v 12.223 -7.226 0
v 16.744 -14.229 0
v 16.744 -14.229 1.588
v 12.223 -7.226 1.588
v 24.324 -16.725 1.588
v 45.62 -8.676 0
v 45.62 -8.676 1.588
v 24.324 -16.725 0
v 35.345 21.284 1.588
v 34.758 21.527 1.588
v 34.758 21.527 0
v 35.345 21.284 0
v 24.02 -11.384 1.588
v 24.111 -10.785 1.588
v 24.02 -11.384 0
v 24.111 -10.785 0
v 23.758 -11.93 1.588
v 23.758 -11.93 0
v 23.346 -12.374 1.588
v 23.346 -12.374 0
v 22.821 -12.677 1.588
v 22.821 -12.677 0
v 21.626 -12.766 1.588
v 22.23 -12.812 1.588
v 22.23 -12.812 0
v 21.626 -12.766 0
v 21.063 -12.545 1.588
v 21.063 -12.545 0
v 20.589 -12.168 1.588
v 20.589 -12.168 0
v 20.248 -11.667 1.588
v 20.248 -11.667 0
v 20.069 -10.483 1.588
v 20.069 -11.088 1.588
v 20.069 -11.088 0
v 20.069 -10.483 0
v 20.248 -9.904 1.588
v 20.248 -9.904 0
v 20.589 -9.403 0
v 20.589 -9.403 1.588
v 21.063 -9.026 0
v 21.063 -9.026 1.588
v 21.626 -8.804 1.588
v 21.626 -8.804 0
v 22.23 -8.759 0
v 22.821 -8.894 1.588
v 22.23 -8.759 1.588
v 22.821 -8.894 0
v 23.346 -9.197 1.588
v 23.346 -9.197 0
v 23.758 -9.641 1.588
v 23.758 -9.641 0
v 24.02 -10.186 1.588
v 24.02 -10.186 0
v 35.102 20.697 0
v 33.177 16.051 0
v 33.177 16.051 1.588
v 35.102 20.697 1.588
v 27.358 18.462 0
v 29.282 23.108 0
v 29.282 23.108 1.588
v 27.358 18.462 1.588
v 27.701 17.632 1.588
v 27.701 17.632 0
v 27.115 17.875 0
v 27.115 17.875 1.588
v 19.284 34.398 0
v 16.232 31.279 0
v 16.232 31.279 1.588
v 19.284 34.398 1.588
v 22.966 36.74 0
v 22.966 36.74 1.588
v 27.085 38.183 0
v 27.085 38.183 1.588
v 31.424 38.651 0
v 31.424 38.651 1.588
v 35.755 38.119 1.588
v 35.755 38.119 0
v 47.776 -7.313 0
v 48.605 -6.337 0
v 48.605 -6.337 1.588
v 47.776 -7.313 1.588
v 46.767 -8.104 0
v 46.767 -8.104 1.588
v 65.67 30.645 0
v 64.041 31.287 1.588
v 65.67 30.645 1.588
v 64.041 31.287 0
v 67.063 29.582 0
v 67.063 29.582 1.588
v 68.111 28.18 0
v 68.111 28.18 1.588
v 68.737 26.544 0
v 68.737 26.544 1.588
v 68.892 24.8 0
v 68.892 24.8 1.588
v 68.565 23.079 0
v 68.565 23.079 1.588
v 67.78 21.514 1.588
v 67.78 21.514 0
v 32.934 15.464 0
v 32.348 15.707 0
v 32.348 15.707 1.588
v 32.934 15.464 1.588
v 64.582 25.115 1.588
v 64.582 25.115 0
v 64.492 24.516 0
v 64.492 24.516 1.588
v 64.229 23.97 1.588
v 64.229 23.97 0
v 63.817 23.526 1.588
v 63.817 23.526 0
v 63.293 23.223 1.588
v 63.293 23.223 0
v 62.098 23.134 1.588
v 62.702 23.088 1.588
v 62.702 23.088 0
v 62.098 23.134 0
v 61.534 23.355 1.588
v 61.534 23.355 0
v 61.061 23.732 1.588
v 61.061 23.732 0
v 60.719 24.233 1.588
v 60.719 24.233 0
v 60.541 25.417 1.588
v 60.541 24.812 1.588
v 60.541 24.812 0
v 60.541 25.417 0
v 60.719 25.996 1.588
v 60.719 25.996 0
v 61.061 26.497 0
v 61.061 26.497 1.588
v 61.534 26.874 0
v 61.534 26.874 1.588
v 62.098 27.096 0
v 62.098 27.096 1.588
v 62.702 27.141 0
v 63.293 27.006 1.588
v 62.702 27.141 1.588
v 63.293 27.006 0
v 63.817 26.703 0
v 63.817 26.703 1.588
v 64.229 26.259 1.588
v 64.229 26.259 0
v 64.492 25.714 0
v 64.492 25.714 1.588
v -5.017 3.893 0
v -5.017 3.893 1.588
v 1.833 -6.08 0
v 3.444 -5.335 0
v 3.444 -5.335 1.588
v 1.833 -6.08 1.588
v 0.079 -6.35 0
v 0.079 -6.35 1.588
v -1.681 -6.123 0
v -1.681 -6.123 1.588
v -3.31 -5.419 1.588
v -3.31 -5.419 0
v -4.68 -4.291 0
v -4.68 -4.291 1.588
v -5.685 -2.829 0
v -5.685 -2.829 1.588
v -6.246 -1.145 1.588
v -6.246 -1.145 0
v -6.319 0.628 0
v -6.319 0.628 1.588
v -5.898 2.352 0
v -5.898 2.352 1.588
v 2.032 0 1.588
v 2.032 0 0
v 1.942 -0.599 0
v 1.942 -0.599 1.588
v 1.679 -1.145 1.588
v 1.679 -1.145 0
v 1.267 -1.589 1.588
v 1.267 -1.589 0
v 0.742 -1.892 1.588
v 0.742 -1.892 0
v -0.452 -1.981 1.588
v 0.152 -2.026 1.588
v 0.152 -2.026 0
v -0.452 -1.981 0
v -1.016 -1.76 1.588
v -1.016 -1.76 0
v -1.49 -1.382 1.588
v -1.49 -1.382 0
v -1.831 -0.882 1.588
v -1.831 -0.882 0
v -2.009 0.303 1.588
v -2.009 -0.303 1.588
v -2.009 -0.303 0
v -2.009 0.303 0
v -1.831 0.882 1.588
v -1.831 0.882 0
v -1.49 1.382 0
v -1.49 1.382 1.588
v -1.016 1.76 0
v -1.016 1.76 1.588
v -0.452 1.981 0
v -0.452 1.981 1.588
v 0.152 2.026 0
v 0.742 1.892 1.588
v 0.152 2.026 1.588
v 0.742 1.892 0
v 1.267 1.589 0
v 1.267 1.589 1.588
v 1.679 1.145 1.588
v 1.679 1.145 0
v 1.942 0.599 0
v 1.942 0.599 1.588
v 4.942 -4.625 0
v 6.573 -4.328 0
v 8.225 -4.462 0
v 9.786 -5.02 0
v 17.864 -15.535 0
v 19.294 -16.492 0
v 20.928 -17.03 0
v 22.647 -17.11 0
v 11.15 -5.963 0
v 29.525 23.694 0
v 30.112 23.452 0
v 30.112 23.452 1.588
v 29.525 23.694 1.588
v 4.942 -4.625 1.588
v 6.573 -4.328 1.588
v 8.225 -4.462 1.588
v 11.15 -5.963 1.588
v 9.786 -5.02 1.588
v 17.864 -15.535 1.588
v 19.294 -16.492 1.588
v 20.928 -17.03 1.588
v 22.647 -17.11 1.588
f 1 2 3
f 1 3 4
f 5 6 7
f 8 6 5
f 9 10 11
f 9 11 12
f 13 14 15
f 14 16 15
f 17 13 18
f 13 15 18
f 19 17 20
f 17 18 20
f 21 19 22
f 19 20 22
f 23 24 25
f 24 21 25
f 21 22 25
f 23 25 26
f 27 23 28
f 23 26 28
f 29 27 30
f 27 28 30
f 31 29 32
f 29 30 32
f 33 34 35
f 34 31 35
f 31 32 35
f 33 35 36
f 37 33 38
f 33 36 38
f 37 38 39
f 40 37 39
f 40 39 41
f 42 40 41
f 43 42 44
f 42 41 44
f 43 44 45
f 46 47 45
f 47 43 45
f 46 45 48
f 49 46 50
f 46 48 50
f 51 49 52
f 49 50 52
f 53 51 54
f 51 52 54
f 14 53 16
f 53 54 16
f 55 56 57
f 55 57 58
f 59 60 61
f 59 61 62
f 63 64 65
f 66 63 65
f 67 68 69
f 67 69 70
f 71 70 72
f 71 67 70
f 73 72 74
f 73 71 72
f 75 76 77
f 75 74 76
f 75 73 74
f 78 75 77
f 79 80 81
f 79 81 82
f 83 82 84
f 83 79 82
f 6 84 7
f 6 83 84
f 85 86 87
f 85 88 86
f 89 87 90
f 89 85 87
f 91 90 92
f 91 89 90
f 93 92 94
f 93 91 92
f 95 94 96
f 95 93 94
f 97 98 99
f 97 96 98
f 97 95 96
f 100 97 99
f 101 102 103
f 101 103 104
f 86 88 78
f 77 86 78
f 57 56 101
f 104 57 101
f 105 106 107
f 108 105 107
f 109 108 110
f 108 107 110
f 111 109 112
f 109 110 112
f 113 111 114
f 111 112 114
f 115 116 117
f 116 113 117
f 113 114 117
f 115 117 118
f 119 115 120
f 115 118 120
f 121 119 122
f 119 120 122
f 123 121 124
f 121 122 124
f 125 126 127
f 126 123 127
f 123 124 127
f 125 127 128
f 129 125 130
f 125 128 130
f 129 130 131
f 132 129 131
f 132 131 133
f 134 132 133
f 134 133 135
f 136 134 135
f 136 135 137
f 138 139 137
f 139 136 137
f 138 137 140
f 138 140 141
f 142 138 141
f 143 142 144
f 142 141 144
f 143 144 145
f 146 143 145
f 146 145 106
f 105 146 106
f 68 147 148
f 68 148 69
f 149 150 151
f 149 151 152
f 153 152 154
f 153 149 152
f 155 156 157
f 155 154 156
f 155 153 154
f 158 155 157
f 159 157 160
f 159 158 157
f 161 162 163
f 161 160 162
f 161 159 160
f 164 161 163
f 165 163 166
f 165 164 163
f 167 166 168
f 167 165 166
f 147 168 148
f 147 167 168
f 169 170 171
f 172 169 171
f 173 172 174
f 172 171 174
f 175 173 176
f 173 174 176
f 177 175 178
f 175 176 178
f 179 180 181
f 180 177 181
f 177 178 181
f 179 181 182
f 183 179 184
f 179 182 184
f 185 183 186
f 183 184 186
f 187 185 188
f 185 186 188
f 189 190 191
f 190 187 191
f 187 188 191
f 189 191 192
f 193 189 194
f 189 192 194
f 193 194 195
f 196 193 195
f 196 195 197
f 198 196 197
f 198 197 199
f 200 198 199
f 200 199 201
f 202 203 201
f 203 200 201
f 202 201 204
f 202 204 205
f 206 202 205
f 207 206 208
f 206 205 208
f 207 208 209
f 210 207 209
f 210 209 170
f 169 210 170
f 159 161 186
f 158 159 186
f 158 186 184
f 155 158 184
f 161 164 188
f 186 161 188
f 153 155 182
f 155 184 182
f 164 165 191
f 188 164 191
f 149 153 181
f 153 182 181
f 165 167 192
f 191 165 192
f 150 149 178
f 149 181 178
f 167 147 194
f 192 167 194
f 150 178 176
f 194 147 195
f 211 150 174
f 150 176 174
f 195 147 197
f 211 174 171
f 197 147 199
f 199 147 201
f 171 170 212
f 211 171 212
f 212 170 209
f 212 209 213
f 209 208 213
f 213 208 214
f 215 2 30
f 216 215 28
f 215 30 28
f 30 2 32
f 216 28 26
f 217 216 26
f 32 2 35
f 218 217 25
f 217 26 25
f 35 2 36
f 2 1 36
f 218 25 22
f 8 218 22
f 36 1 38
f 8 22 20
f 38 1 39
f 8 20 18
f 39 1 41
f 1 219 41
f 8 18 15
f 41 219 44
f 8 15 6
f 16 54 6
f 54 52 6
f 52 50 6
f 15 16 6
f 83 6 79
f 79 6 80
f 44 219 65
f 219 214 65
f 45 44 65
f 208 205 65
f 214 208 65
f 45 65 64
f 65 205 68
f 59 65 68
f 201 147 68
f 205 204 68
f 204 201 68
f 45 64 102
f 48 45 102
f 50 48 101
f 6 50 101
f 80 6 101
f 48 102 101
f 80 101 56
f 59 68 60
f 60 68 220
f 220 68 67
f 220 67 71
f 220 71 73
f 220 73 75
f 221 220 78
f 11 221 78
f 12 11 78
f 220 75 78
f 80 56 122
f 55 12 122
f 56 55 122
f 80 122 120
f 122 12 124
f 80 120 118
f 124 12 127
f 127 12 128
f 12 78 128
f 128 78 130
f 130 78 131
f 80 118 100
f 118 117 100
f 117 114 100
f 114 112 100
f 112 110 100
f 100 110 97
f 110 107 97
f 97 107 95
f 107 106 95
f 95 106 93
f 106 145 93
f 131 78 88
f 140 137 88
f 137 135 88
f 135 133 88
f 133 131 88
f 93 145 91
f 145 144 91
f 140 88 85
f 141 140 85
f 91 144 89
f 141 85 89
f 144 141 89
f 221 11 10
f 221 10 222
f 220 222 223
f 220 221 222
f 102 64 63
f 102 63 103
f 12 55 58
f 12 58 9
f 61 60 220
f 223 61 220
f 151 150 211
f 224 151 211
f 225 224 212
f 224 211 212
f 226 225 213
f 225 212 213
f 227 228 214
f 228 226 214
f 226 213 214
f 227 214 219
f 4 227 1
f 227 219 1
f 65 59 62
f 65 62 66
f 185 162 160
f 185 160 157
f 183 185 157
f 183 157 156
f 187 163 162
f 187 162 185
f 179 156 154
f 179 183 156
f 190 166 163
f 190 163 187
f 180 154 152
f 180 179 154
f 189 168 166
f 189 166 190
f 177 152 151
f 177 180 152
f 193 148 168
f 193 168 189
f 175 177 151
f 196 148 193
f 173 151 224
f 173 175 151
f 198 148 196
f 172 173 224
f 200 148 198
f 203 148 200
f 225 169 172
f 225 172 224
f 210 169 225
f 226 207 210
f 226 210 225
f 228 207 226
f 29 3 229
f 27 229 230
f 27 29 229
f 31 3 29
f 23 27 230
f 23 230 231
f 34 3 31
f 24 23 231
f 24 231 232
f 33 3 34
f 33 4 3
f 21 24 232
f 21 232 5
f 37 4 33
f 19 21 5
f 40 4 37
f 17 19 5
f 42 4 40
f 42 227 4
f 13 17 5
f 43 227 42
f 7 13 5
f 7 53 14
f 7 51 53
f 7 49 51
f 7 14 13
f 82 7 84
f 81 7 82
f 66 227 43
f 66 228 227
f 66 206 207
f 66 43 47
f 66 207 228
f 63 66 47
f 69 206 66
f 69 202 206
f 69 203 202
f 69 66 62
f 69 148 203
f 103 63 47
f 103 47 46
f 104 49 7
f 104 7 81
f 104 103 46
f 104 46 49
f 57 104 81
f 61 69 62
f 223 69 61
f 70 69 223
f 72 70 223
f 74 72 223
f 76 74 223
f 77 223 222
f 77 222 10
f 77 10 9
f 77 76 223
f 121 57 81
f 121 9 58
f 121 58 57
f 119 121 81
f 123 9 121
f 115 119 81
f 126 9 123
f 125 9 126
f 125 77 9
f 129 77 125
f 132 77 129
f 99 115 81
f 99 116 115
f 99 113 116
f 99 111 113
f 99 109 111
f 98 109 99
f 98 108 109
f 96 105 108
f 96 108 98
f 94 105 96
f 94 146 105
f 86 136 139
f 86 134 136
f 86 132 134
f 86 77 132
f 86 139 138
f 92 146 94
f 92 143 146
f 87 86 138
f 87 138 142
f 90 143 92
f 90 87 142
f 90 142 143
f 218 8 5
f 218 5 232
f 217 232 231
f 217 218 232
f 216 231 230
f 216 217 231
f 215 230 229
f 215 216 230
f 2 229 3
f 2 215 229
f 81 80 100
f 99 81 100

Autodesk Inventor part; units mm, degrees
ref_plane "YZ Plane" through (0, 0, 0) normal (1, 0, 0) x (0, 1, 0)
ref_plane "XZ Plane" through (0, 0, 0) normal (0, 1, 0) x (-1, 0, 0)
ref_plane "XY Plane" through (0, 0, 0) normal (0, 0, 1) x (1, 0, 0)
sketch "Sketch1" plane through (0, 0, 0) normal (0, 0, 1) x (1, 0, 0)
  circle A0 centre (0, 0) radius 2.0955 construction
  circle A1 centre (31.2825, 19.6012) radius 7.2 construction
  circle A2 centre (43.3748, -2.7357) radius 2.15 construction
  circle A3 centre (31.2825, 19.6012) radius 31.75 construction
  circle A4 centre (43.3748, -2.7357) radius 2.032 construction
  line L0 (31.2825, 19.6012) -> (31.2825, -12.1488) construction
  circle A5 centre (31.2825, -12.1488) radius 2.032 construction
  line L1 (31.2825, 19.6012) -> (62.5502, 25.1146) construction
  line L2 (31.2825, 19.6012) -> (63.0325, 19.6012) construction
  circle A6 centre (62.5502, 25.1146) radius 2.032
  arc A7 (67.7804, 21.5135) -> (64.041, 31.2871) centre (62.5502, 25.1146) ccw
  circle A8 centre (0, 0) radius 2.032
  arc A9 (-5.017, 3.8926) -> (3.4439, -5.335) centre (0, 0) ccw
  arc A10 (45.62, -8.6755) -> (48.605, -6.3367) centre (43.3748, -2.7357) ccw
  circle A11 centre (22.0786, -10.7854) radius 2.032
  line L3 (48.605, -6.3367) -> (67.7804, 21.5135)
  arc A12 (35.755, 38.1188) -> (16.2316, 31.279) centre (31.2825, 19.6012) ccw
  line L4 (64.041, 31.2871) -> (35.755, 38.1188)
  line L5 (-5.017, 3.8926) -> (16.2316, 31.279)
  arc A13 (16.7437, -14.2294) -> (24.3239, -16.7253) centre (22.0786, -10.7854) ccw
  arc A14 (12.2228, -7.226) -> (3.4439, -5.335) centre (6.8878, -10.67) ccw
  line L6 (16.7437, -14.2294) -> (12.2228, -7.226)
  line L7 (45.9985, -8.5324) -> (24.3239, -16.7253)
  line L8 (27.7013, 17.6318) -> (32.3477, 15.7072)
  line L9 (27.7013, 17.6318) -> (27.7013, 17.6318)
  line L10 (32.3477, 15.7072) -> (27.7013, 17.6318)
  line L11 (32.3477, 15.7072) -> (32.3477, 15.7072)
  line L12 (33.1773, 16.0509) -> (35.1019, 20.6973)
  line L13 (33.1773, 16.0509) -> (33.1773, 16.0509)
  line L14 (35.1019, 20.6973) -> (33.1773, 16.0509)
  line L15 (35.1019, 20.6973) -> (35.1019, 20.6973)
  line L16 (34.7583, 21.5269) -> (30.1119, 23.4515)
  line L17 (34.7583, 21.5269) -> (34.7583, 21.5269)
  line L18 (30.1119, 23.4515) -> (34.7583, 21.5269)
  line L19 (30.1119, 23.4515) -> (30.1119, 23.4515)
  line L20 (29.2822, 23.1079) -> (27.3576, 18.4615)
  line L21 (29.2822, 23.1079) -> (29.2822, 23.1079)
  line L22 (27.3576, 18.4615) -> (29.2822, 23.1079)
  line L23 (27.3576, 18.4615) -> (27.3576, 18.4615)
  line L24 (35.1019, 20.6973) -> (35.3449, 21.2839)
  line L25 (34.7583, 21.5269) -> (35.3449, 21.2839)
  line L26 (33.1773, 16.0509) -> (32.9343, 15.4642)
  line L27 (32.3477, 15.7072) -> (32.9343, 15.4642)
  line L28 (29.2822, 23.1079) -> (29.5252, 23.6945)
  line L29 (30.1119, 23.4515) -> (29.5252, 23.6945)
  line L30 (27.3576, 18.4615) -> (27.1146, 17.8748)
  line L31 (27.7013, 17.6318) -> (27.1146, 17.8748)
  point P0 (0, 0)
extrude "Plate1" add sketch "Sketch1" along normal blind 1.5875
sketch "Sketch2" plane through (0, 0, 1.5875) normal (0, 0, 1) x (1, 0, 0)
  arc A0 (-5.017, 3.8926) -> (3.4439, -5.335) centre (0, 0) ccw projected
  line L0 (-5.017, 3.8926) -> (16.2316, 31.279) projected
  arc A1 (35.755, 38.1188) -> (16.2316, 31.279) centre (31.2825, 19.6012) ccw projected
  line L1 (35.755, 38.1188) -> (64.041, 31.2871) projected
  arc A2 (67.7804, 21.5135) -> (64.041, 31.2871) centre (62.5502, 25.1146) ccw projected
  line L2 (67.7804, 21.5135) -> (48.605, -6.3367) projected
  arc A3 (45.62, -8.6755) -> (48.605, -6.3367) centre (43.3748, -2.7357) ccw projected
  line L3 (45.62, -8.6755) -> (24.3239, -16.7253) projected
  arc A4 (16.7437, -14.2294) -> (24.3239, -16.7253) centre (22.0786, -10.7854) ccw projected
  line L4 (16.7437, -14.2294) -> (12.2228, -7.226) projected
  arc A5 (12.2228, -7.226) -> (3.4439, -5.335) centre (6.8878, -10.67) ccw projected
  circle A6 centre (0, 0) radius 2.032 projected
  circle A7 centre (22.0786, -10.7854) radius 2.032 projected
  circle A8 centre (62.5502, 25.1146) radius 2.032 projected
  line L5 (29.5252, 23.6945) -> (35.3449, 21.2839) projected
  line L6 (27.1146, 17.8748) -> (29.5252, 23.6945) projected
  line L7 (35.3449, 21.2839) -> (32.9343, 15.4642) projected
  line L8 (32.9343, 15.4642) -> (27.1146, 17.8748) projected
  point P0 (0, 0)
equation "\"d20\" = Thickness"
equation "\"BendRadius\" = Thickness"
equation "\"BendReliefWidth\" = Thickness"
equation "\"BendReliefDepth\" = 0.5 * Thickness"
equation "\"CornerReliefSize\" = 4 * Thickness"
equation "\"MinimumRemnant\" = 2 * Thickness"
equation "\"TransitionRadius\" = BendRadius"
equation "\"JacobiRadiusSize\" = BendRadius"
equation "\"GapSize\" = Thickness"
equation "\"Thickness\" = 1.5875"
properties part number "Rear Vertical Odom Pod" material "Acetal Resin, White"
